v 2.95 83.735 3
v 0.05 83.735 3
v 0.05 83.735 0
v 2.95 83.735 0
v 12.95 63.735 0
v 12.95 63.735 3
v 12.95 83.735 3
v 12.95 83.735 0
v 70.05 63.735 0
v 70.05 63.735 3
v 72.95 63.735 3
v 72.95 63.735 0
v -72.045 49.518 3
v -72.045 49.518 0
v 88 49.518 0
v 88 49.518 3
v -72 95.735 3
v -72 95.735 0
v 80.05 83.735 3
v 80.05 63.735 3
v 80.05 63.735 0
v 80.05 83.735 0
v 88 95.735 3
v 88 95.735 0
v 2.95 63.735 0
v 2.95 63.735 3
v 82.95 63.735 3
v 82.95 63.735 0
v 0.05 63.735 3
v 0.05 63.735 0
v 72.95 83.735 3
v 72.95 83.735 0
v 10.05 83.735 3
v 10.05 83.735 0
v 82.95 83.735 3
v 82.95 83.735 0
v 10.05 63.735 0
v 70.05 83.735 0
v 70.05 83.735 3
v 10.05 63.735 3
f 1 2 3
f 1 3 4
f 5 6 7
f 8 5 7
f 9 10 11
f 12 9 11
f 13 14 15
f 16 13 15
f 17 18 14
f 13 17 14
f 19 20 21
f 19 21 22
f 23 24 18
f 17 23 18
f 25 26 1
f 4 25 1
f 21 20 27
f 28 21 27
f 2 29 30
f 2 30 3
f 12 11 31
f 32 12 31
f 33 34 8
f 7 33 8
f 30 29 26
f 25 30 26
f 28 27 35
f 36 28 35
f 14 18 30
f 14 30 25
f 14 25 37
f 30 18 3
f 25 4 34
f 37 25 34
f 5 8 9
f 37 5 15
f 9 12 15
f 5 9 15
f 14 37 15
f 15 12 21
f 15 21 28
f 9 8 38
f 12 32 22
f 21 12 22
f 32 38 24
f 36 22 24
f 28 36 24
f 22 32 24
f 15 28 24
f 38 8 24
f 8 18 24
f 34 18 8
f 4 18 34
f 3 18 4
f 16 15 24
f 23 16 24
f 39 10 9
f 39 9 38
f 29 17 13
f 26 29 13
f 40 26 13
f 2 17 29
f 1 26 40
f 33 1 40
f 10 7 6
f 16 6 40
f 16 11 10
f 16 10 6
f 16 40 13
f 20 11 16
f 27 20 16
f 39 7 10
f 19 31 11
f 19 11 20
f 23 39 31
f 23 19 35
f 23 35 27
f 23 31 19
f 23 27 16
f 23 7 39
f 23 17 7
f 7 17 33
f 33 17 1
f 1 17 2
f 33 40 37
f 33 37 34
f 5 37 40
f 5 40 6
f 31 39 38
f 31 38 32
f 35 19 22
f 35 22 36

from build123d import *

# Parameters (mm, degrees)
BOSS_EXTRUDE1_DEPTH = 3
SKETCH4_W           = 2.9
SKETCH4_H           = 20
CUT_EXTRUDE1_DEPTH  = 4


with BuildPart() as part:
    # Sketch3 → Boss-Extrude1 (new body)
    with BuildSketch(Plane(origin=(0, 0, 0), x_dir=(0.999999536, -0.000963417, 0), z_dir=(0, 0, 1))):
        Polygon((87.907726379, 95.819824151), (-72.092273621, 95.665677408), (-72.092273621, 49.448943998), (87.95225233, 49.603133638), align=None)
    extrude(amount=BOSS_EXTRUDE1_DEPTH)

    # Sketch4 → Cut-Extrude1 (cut, through all)
    with BuildSketch(Plane.XY.offset(3)):
        with Locations((1.5, 73.735087911)):
            Rectangle(SKETCH4_W, SKETCH4_H)
        with Locations((11.5, 73.735087911)):
            Rectangle(SKETCH4_W, SKETCH4_H)
        with Locations((71.5, 73.735087911)):
            Rectangle(SKETCH4_W, SKETCH4_H)
        with Locations((81.5, 73.735087911)):
            Rectangle(SKETCH4_W, SKETCH4_H)
    extrude(amount=-CUT_EXTRUDE1_DEPTH, mode=Mode.SUBTRACT)


solid = part.part
